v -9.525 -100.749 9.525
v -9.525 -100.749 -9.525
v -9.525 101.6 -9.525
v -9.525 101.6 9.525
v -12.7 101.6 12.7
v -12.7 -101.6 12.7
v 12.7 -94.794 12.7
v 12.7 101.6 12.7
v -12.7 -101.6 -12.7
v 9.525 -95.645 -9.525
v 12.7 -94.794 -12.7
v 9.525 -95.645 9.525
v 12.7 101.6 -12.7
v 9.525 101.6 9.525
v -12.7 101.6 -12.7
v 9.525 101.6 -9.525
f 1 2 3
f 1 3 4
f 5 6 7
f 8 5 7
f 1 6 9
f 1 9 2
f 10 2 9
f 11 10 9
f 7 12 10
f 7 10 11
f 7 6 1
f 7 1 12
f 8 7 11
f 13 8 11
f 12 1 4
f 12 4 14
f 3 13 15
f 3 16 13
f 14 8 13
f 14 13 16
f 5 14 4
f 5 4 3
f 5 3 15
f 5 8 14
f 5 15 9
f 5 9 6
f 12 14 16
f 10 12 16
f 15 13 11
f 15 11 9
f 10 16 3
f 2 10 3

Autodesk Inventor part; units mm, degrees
ref_plane "YZ Plane" through (0, 0, 0) normal (1, 0, 0) x (0, 1, 0)
ref_plane "XZ Plane" through (0, 0, 0) normal (0, 1, 0) x (-1, 0, 0)
ref_plane "XY Plane" through (0, 0, 0) normal (0, 0, 1) x (1, 0, 0)
sketch "Sketch1" plane through (0, 0, 0) normal (0, 1, 0) x (-1, 0, 0)
  line L0 (12.7, 12.7) -> (-12.7, 12.7)
  line L1 (-12.7, 12.7) -> (-12.7, -12.7)
  line L2 (-12.7, -12.7) -> (12.7, -12.7)
  line L3 (12.7, -12.7) -> (12.7, 12.7)
  line L4 (12.7, 12.7) -> (-12.7, -12.7) construction
  line L5 (-12.7, 12.7) -> (12.7, -12.7) construction
  line L6 (9.525, 9.525) -> (-9.525, 9.525)
  line L7 (-9.525, 9.525) -> (-9.525, -9.525)
  line L8 (-9.525, -9.525) -> (9.525, -9.525)
  line L9 (9.525, -9.525) -> (9.525, 9.525)
  line L10 (9.525, 9.525) -> (-9.525, -9.525) construction
  line L11 (-9.525, 9.525) -> (9.525, -9.525) construction
  point P0 (0, 0)
  dimension "d0" = 25.4
  dimension "d1" = 25.4
  dimension "d2" = 3.175
  dimension "d3" = 3.175
extrude "Extrusion1" add sketch "Sketch1" along normal mid plane 203.2
sketch "Sketch2" plane through (-12.7, 101.6, 12.7) normal (0, 0, 1) x (1, 0, 0)
  line L0 (25.4, -203.2) -> (0, -203.2) projected
  line L1 (0, -203.2) -> (25.4, -196.3941)
  line L2 (25.4, -203.2) -> (0, -203.2)
  line L3 (25.4, 0) -> (25.4, -203.2) projected
  line L4 (25.4, -203.2) -> (25.4, -196.3941)
  point P0 (12.7, -101.6)
  dimension "d6" = 15
extrude "Extrusion2" cut sketch "Sketch2" against normal through all
properties part number "motorBracket-15-degreeBase"
